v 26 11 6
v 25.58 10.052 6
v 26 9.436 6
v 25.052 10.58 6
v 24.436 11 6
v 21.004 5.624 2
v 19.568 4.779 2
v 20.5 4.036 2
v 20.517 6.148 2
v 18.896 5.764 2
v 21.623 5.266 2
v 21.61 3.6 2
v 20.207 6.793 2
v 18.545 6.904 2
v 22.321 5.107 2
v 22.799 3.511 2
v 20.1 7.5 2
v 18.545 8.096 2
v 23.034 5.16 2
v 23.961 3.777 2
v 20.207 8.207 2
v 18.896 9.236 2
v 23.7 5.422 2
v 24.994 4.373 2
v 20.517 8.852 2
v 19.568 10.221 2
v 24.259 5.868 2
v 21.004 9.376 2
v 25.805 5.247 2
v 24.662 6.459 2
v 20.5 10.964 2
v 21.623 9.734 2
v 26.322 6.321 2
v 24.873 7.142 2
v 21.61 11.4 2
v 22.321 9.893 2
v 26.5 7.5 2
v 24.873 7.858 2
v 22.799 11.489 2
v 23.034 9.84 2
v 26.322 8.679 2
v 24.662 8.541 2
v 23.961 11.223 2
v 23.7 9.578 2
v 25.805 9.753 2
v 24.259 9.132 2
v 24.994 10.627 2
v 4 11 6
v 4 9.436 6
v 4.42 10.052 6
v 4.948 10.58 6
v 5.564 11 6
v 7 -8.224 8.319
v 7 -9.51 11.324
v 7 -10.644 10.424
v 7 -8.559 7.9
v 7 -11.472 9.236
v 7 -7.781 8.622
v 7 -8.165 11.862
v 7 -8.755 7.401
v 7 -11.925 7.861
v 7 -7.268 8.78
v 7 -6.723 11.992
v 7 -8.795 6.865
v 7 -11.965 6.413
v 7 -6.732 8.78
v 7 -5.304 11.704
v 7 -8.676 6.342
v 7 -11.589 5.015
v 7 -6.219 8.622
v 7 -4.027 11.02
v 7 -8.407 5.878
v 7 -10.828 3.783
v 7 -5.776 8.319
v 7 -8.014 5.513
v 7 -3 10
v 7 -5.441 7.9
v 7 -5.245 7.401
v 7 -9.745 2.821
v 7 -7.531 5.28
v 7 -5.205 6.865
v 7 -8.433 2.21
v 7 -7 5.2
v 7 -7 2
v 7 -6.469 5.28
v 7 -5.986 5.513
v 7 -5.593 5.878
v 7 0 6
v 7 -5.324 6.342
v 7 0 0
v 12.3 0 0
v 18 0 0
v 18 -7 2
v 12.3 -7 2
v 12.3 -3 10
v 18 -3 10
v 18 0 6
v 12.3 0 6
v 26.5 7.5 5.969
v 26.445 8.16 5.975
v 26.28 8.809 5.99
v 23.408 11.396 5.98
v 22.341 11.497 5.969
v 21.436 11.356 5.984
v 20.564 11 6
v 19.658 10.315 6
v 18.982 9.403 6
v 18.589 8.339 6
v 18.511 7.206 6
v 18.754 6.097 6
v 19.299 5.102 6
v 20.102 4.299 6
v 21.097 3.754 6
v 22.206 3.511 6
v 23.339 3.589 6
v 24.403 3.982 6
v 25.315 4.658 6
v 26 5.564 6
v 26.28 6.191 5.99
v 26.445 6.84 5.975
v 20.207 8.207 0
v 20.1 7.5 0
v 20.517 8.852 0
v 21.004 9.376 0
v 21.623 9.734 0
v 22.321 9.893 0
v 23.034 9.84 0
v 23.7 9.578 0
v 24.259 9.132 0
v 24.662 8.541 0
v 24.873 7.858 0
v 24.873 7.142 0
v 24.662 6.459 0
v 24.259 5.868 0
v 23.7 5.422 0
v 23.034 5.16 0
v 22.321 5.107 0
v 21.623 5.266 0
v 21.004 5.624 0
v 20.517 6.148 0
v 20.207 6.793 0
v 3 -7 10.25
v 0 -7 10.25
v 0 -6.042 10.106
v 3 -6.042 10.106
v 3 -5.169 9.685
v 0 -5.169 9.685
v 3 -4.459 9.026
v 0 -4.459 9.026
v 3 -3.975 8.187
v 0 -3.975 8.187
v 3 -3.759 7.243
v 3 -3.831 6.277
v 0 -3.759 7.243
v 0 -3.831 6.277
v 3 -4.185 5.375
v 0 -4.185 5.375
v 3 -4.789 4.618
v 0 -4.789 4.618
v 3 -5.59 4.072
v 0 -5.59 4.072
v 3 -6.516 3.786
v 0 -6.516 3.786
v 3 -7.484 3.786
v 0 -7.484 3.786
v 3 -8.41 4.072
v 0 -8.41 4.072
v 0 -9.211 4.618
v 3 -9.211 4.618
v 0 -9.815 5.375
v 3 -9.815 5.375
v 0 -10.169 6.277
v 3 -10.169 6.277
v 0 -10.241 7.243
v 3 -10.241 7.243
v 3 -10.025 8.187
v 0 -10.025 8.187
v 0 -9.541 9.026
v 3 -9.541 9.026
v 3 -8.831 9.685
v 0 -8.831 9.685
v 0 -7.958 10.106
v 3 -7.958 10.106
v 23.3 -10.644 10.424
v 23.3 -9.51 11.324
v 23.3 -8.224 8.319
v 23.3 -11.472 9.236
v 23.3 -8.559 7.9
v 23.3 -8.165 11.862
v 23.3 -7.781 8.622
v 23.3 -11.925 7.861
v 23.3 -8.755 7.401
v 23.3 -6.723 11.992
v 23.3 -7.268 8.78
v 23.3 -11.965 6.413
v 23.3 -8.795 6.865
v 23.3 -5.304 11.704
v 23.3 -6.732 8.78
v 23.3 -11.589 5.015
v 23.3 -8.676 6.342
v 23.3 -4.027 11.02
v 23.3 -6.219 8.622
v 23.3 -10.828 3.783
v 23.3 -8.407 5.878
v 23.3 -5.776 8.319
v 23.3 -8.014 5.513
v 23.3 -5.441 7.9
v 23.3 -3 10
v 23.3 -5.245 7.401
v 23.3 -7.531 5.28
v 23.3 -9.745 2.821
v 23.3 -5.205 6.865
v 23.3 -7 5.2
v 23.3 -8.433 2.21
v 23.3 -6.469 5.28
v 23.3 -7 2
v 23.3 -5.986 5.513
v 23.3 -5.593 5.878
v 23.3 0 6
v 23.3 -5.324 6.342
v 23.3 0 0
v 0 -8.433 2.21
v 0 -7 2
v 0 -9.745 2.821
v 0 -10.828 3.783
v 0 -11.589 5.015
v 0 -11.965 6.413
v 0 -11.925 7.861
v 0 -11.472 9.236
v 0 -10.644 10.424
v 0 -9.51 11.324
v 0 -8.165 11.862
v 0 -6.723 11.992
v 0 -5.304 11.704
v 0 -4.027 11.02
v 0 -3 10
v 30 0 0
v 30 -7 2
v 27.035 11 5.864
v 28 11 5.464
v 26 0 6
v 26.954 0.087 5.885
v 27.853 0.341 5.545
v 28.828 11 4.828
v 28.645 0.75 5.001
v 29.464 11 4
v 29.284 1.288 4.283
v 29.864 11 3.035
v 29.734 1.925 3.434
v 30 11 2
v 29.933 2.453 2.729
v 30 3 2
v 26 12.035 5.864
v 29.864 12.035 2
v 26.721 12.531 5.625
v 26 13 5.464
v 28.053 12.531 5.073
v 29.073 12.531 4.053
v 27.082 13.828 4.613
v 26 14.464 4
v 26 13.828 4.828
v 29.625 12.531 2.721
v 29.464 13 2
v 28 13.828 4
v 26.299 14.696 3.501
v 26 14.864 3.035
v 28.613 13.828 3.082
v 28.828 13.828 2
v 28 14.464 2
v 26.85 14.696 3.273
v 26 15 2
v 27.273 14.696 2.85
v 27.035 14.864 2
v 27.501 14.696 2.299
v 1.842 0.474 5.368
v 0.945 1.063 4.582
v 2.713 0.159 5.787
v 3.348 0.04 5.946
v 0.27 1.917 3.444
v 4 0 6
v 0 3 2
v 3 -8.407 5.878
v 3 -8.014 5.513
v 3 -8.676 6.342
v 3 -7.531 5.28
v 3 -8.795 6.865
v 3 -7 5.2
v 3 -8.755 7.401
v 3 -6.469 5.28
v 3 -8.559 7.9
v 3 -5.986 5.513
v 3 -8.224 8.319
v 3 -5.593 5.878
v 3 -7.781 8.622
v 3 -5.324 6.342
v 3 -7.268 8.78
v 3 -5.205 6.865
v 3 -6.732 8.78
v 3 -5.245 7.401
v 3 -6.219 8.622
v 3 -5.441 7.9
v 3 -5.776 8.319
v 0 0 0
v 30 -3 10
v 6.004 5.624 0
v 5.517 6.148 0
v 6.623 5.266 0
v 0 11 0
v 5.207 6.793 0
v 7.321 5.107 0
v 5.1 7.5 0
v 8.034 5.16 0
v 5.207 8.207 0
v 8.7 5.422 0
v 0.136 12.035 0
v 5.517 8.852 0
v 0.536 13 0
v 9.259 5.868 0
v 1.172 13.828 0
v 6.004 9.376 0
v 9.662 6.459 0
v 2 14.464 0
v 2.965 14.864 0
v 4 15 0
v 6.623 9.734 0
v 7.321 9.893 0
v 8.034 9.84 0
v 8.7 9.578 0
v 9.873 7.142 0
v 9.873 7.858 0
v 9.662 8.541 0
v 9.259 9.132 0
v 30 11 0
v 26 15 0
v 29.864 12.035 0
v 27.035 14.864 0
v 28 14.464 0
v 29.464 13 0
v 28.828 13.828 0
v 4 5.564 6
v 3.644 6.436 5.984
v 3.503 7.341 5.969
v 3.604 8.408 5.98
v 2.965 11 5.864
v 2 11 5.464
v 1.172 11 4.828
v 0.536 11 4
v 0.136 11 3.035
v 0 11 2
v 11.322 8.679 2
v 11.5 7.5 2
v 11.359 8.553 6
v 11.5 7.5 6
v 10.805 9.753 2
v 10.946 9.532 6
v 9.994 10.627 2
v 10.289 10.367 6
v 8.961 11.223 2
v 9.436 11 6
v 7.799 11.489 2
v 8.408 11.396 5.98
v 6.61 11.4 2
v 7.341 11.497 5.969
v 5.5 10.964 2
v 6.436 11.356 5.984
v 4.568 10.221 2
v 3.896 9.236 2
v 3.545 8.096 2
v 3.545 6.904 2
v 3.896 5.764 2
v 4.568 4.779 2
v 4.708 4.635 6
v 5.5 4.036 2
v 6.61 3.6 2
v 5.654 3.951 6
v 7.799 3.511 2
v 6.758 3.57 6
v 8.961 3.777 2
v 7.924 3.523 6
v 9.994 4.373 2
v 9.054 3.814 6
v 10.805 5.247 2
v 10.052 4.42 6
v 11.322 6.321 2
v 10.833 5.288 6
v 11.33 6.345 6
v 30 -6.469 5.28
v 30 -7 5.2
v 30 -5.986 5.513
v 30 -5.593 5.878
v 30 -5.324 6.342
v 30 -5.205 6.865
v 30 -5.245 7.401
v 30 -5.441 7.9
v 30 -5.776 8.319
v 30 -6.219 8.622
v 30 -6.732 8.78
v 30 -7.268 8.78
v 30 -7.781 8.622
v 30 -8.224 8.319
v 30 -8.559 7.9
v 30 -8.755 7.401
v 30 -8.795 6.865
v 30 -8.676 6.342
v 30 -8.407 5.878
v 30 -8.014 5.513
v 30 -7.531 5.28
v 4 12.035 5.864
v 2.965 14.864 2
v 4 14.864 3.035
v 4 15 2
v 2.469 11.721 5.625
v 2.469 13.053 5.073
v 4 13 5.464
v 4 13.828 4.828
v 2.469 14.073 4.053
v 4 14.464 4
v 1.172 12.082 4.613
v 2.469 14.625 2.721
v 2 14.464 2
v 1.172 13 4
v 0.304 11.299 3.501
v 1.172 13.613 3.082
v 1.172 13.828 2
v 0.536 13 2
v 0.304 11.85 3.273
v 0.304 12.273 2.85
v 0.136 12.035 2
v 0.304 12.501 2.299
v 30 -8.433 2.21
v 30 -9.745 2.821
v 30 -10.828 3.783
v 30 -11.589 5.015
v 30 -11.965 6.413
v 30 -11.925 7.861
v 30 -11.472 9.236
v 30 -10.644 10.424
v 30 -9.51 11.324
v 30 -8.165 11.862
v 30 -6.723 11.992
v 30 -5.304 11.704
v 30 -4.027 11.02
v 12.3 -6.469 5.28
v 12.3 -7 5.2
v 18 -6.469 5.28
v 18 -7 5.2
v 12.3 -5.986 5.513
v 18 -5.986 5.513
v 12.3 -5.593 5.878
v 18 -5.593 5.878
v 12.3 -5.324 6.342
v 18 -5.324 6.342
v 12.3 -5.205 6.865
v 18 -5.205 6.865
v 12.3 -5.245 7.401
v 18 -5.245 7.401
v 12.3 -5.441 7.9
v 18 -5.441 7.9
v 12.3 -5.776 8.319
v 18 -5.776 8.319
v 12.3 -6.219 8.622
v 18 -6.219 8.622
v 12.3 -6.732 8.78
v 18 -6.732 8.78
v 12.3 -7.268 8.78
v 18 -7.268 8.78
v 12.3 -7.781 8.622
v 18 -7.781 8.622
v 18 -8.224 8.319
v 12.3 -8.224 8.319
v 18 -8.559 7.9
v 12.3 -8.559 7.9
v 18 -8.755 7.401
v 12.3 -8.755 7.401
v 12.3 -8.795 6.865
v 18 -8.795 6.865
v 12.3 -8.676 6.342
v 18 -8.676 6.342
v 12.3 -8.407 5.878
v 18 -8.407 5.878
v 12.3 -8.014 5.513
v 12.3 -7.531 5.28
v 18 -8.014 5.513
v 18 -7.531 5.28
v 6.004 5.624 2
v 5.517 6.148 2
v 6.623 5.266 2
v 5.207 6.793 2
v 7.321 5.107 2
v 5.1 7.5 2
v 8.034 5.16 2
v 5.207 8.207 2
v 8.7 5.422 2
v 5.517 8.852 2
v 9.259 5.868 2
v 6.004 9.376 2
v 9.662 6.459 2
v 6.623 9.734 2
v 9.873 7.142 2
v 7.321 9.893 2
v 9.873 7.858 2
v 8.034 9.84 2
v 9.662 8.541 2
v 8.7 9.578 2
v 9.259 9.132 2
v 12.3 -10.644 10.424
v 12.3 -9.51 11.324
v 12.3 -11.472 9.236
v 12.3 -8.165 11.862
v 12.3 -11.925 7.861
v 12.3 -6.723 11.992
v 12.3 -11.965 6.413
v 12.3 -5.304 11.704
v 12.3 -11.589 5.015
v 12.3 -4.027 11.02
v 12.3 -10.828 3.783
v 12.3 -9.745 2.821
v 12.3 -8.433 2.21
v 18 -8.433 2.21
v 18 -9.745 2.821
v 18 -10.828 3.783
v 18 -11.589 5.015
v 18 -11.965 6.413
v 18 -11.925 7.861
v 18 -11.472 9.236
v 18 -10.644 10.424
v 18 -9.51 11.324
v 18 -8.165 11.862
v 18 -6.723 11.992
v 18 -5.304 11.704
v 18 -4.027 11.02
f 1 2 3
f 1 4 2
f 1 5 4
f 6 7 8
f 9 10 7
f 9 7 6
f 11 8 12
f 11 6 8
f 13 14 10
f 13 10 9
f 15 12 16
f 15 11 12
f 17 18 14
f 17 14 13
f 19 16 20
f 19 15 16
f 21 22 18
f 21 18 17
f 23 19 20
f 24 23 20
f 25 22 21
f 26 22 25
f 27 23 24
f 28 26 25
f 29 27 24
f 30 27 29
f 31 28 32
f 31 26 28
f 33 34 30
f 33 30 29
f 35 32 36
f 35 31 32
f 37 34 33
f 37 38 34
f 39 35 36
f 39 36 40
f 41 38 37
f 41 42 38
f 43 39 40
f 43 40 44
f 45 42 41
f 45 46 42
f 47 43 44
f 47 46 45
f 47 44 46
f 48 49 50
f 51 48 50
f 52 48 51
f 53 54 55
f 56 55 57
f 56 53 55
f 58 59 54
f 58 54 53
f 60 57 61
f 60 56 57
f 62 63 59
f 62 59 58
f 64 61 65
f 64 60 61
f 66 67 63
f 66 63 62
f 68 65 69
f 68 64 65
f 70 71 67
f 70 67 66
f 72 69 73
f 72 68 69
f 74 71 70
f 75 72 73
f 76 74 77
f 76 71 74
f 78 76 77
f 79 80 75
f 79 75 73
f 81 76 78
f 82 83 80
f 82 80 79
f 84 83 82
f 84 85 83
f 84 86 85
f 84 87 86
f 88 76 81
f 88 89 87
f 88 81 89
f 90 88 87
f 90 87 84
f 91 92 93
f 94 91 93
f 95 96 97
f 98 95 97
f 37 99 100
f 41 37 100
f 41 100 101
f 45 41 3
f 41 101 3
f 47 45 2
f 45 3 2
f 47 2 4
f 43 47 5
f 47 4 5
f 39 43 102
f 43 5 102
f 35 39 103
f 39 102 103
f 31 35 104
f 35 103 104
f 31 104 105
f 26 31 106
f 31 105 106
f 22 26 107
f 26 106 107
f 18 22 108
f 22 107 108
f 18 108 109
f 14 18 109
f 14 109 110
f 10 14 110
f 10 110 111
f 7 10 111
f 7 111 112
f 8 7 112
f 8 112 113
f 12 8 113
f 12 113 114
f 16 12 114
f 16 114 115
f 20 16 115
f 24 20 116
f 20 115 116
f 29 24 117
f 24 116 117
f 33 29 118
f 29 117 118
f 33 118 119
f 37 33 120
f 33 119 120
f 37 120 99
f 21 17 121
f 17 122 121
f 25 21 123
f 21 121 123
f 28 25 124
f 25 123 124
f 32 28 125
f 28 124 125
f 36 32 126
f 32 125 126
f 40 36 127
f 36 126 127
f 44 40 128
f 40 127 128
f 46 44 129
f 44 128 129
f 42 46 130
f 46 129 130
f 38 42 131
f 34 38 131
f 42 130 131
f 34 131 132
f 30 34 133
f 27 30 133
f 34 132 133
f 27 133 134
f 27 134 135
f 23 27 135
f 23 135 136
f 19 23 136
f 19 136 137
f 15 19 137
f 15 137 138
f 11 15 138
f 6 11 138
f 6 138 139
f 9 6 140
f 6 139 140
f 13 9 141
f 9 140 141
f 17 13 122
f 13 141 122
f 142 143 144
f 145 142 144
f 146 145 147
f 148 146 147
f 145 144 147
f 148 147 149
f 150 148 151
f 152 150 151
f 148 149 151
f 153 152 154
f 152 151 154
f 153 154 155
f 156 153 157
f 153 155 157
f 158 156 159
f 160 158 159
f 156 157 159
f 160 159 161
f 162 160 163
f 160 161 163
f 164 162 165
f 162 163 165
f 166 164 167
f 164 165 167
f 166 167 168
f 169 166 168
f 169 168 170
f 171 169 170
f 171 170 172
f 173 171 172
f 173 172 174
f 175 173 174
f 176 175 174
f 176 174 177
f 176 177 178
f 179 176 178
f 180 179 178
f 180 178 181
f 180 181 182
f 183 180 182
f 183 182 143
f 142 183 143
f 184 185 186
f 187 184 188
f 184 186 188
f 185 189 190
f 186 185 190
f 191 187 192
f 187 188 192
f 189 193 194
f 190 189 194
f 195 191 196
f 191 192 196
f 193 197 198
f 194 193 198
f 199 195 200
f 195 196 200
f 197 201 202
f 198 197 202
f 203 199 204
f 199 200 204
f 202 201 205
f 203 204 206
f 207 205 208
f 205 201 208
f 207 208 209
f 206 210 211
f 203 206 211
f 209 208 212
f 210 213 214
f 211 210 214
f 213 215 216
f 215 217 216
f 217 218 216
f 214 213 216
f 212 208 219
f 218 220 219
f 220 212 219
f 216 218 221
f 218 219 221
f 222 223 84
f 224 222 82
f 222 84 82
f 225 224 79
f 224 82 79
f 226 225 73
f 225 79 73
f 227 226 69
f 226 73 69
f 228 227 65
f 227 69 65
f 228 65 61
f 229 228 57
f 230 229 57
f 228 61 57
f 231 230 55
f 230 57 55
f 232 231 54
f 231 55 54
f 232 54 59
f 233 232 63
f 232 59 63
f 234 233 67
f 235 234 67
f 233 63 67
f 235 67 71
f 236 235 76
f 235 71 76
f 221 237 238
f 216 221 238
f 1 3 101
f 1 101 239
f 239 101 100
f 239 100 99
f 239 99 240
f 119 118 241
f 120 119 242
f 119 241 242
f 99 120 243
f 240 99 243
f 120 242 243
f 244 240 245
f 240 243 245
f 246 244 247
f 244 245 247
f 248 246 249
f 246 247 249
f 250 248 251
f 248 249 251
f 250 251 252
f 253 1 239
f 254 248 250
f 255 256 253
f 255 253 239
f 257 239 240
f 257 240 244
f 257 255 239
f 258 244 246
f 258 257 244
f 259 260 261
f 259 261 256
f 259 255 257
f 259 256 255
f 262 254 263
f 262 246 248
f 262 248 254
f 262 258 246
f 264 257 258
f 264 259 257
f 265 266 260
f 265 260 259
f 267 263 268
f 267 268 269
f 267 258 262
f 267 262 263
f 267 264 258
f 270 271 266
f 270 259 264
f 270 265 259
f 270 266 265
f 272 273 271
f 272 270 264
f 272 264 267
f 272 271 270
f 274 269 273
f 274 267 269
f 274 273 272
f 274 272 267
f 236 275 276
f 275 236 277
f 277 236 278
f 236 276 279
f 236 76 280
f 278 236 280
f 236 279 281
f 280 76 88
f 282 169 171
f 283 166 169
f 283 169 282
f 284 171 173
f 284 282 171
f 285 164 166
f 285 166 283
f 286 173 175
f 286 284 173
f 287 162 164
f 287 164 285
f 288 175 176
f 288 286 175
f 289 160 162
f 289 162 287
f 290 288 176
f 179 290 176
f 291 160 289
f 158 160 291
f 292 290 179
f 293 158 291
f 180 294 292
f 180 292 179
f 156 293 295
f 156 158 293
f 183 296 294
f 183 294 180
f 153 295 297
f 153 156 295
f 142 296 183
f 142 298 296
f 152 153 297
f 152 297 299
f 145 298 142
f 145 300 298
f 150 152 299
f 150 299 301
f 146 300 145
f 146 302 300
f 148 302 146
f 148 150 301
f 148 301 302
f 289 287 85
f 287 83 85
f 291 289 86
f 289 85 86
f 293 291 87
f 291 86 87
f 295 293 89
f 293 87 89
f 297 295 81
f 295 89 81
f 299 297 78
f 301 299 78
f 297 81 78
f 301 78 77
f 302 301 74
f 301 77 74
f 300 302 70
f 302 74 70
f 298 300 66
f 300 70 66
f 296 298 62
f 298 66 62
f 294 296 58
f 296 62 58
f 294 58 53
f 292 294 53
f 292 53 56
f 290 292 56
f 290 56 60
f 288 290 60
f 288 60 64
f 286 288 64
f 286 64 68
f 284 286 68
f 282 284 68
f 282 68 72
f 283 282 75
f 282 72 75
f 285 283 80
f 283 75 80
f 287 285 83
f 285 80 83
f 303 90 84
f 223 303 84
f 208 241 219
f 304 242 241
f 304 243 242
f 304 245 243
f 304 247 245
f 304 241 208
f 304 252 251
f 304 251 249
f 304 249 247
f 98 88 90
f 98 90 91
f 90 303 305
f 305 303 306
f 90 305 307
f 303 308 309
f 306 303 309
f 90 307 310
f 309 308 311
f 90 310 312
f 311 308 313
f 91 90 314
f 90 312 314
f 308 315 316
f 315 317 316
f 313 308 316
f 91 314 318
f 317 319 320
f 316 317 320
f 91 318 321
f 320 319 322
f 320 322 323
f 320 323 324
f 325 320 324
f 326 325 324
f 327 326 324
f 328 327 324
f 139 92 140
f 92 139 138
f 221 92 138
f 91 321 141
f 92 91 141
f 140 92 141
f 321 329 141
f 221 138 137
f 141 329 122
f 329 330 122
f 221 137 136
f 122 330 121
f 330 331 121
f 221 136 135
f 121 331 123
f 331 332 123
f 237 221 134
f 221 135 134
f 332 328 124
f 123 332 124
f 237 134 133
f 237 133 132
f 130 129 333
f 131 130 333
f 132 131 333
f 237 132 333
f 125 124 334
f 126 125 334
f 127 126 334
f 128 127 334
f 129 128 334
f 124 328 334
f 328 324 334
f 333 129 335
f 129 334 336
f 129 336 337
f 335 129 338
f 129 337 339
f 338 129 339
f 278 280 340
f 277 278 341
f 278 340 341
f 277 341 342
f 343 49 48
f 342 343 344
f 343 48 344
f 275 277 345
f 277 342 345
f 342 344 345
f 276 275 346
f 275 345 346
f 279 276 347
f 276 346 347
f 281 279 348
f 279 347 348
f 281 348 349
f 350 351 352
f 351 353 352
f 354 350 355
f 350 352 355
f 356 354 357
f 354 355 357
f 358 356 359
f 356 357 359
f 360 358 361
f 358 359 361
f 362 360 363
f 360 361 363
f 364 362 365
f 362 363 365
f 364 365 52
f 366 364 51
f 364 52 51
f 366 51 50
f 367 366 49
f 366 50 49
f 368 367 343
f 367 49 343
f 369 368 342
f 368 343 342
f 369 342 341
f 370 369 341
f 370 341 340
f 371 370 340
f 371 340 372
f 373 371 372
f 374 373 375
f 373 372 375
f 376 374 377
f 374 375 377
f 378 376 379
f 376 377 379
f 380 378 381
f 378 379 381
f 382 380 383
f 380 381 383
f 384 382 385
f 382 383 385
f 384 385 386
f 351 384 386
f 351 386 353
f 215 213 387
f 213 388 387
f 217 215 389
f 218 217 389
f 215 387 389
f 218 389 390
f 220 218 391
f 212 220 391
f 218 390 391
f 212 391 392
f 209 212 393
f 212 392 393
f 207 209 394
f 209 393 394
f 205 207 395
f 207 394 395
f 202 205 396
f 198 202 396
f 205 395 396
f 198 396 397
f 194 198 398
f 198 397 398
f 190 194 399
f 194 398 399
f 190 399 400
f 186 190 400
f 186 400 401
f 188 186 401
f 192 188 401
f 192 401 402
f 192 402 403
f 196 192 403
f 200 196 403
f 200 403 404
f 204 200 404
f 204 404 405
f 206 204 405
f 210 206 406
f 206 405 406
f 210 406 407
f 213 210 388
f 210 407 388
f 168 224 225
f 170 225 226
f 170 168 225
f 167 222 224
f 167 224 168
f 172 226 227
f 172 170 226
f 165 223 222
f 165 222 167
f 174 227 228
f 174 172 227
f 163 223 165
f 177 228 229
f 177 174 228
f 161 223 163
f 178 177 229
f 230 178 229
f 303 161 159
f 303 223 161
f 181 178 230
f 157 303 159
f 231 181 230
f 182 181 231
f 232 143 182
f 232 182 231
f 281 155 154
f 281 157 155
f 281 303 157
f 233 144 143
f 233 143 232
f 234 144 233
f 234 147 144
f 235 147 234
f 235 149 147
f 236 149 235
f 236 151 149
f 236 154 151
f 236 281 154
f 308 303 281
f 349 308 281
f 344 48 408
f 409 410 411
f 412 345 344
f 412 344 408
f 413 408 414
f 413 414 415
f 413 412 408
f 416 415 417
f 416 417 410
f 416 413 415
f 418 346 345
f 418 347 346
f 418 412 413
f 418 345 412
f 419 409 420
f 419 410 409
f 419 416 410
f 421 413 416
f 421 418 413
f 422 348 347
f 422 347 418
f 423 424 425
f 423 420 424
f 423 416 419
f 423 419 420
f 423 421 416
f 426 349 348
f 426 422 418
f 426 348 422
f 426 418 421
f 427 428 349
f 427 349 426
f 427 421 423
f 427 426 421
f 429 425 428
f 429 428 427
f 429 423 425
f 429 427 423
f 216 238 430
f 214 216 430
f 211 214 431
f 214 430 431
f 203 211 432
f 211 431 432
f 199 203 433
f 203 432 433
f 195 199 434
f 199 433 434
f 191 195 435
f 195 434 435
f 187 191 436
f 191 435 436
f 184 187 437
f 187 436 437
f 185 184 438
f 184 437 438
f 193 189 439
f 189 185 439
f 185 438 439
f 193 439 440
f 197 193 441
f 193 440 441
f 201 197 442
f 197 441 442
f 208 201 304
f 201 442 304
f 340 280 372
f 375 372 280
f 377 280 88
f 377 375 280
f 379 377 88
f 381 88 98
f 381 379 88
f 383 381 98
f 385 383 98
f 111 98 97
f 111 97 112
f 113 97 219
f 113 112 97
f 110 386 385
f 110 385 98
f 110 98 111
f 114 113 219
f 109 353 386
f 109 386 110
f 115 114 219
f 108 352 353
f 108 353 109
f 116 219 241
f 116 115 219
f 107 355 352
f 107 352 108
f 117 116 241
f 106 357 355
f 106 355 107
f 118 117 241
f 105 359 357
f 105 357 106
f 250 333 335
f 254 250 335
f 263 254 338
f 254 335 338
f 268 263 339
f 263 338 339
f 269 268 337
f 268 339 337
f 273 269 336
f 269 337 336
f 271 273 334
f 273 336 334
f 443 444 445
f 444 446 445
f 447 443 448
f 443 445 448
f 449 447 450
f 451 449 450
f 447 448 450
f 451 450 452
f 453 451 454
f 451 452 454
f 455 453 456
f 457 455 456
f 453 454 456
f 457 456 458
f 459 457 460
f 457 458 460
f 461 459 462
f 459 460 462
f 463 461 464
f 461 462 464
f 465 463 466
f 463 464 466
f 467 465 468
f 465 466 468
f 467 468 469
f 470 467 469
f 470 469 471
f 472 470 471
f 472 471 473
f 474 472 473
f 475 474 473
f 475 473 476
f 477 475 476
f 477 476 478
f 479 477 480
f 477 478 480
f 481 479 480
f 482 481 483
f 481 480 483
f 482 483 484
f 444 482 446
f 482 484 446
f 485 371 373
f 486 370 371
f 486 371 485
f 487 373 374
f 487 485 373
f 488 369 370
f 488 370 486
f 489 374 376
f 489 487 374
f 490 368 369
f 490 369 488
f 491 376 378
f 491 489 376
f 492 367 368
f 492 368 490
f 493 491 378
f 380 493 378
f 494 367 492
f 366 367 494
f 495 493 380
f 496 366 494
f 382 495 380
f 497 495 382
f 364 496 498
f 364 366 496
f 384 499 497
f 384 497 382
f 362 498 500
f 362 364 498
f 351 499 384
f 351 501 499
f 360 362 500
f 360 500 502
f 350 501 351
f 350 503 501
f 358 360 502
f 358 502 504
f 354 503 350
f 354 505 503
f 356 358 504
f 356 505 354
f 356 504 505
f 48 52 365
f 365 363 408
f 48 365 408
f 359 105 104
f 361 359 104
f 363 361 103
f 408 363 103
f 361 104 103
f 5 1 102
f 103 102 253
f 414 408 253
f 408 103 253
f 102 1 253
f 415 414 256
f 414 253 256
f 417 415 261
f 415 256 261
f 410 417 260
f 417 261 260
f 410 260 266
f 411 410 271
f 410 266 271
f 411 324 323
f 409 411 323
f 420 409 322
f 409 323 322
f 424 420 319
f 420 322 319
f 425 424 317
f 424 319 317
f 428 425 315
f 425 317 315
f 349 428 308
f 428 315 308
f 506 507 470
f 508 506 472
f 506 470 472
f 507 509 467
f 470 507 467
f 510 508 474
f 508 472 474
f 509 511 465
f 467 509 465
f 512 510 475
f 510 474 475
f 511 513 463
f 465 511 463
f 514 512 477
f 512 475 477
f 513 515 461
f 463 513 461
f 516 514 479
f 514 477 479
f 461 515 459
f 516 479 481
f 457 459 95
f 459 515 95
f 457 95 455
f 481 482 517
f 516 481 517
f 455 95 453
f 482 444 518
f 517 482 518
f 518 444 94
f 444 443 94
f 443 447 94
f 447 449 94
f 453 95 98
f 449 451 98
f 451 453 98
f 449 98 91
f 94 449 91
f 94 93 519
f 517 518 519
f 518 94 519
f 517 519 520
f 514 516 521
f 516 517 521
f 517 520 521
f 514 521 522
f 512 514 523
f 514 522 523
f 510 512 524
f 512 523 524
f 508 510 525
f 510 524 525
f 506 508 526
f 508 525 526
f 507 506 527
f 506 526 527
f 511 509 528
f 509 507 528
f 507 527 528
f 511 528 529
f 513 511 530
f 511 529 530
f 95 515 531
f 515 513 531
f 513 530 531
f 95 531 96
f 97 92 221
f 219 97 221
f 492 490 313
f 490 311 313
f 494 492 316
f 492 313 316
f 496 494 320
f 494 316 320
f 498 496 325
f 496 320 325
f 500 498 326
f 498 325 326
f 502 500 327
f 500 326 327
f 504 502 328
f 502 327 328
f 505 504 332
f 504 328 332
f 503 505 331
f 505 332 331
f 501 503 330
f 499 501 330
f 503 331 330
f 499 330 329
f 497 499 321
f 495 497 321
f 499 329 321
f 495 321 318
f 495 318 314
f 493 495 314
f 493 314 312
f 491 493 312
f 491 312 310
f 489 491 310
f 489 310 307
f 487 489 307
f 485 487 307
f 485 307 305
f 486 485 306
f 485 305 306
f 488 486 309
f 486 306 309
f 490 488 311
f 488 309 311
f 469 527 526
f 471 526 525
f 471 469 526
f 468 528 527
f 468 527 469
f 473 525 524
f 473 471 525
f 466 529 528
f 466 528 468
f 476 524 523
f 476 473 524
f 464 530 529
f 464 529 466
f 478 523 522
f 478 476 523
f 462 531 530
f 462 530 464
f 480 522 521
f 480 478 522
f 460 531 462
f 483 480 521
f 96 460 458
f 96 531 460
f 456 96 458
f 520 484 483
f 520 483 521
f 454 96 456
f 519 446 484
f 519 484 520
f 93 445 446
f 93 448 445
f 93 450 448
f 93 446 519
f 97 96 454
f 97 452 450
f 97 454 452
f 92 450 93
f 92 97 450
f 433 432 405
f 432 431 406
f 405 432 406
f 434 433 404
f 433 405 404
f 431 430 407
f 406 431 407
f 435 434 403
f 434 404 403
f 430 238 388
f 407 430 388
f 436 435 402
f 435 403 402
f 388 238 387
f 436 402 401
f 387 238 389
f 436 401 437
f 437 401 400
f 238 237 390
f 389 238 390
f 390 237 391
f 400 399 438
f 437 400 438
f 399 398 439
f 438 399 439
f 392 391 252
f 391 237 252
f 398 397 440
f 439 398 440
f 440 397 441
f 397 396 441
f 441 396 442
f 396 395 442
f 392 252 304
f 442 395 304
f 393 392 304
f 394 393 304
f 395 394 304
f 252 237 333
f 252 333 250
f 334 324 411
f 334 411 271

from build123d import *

# Parameters (mm, degrees)
SKETCH2_W                      = 30
SKETCH2_H                      = 15
BOSS_EXTRUDE1_DEPTH            = 6
CBORE_FOR_M4_SHCS1_D           = 4.8
CBORE_FOR_M4_SHCS1_CBORE_D     = 8
CBORE_FOR_M4_SHCS1_CBORE_DEPTH = 4
BOSS_EXTRUDE2_DEPTH            = 30
CUT_EXTRUDE1_START             = -15
SKETCH6_W                      = 5.3
SKETCH6_H                      = 20.435085946
SKETCH6_H_2                    = 17.047451378
CUT_EXTRUDE1_DEPTH             = 28.107006543
FILLET1_R                      = 4
CBORE_FOR_M3_SHCS1_D           = 3.6
CBORE_FOR_M3_SHCS1_CBORE_D     = 6.5
CBORE_FOR_M3_SHCS1_CBORE_DEPTH = 3


with BuildPart() as part:
    # Sketch2 → Boss-Extrude1 (new body)
    with BuildSketch(Plane.XY):
        with Locations((15, 7.5)):
            Rectangle(SKETCH2_W, SKETCH2_H)
    extrude(amount=BOSS_EXTRUDE1_DEPTH)

    # CBORE for M4 SHCS1 (through all)
    with Locations(Plane.XY.offset(6)):
        with Locations((7.5, 7.5), (22.5, 7.5)):
            CounterBoreHole(CBORE_FOR_M4_SHCS1_D / 2, CBORE_FOR_M4_SHCS1_CBORE_D / 2, CBORE_FOR_M4_SHCS1_CBORE_DEPTH)

    # Sketch5 → Boss-Extrude2 (add)
    with BuildSketch(Plane(origin=(30, 0, 0), x_dir=(0, 0, -1), z_dir=(1, 0, 0))):
        with BuildLine():
            Line((0, 0), (-2, -7))
            ThreePointArc((-2, -7), (-9.236067977, -11.472135955), (-10, -3))
            Line((-10, -3), (-6, 0))
            Line((-6, 0), (0, 0))
        make_face()
    extrude(amount=-BOSS_EXTRUDE2_DEPTH)

    # Sketch6 → Cut-Extrude1 (cut, through all)
    with BuildSketch(Plane(origin=(0, 15, 0), x_dir=(1, 0, 0), z_dir=(0, 1, 0)).offset(CUT_EXTRUDE1_START)):
        with Locations((20.65, -5.918041099)):
            Rectangle(SKETCH6_W, SKETCH6_H)
        with Locations((9.65, -5.207730625)):
            Rectangle(SKETCH6_W, SKETCH6_H_2)
    extrude(amount=-CUT_EXTRUDE1_DEPTH, mode=Mode.SUBTRACT)

    # Fillet1
    # the kernel refuses this fillet: 4 mm, written as the material it takes off along each edge
    with BuildSketch(Plane(origin=(26, 11, 2), x_dir=(0, 0, 1), z_dir=(0, 1, 0))) as fillet1_piece_1_section:
        Polygon((0, 0), (FILLET1_R, 0), (FILLET1_R, FILLET1_R), (0, FILLET1_R), align=None)
    fillet1_piece_1 = extrude(amount=FILLET1_R, mode=Mode.PRIVATE)
    fillet1_piece_1 = fillet1_piece_1 - Plane(origin=(26, 11, 2), x_dir=(-0.7071067811865475, 0, -0.7071067811865475), z_dir=(0, 1, 0)) * Sphere(FILLET1_R, mode=Mode.PRIVATE)
    add(fillet1_piece_1, mode=Mode.SUBTRACT)
    with BuildSketch(Plane(origin=(4, 11, 2), x_dir=(0, 1, 0), z_dir=(-1, 0, 0))) as fillet1_piece_2_section:
        Polygon((0, 0), (FILLET1_R, 0), (FILLET1_R, -FILLET1_R), (0, -FILLET1_R), align=None)
    fillet1_piece_2 = extrude(amount=FILLET1_R, mode=Mode.PRIVATE)
    fillet1_piece_2 = fillet1_piece_2 - Plane(origin=(4, 11, 2), x_dir=(0, -0.7071067811865475, -0.7071067811865475), z_dir=(-1, 0, 0)) * Sphere(FILLET1_R, mode=Mode.PRIVATE)
    add(fillet1_piece_2, mode=Mode.SUBTRACT)
    with BuildSketch(Plane(origin=(30, -10, 6), x_dir=(-1, 0, 0), z_dir=(0, 1, 0))) as fillet1_piece_3_section:
        with BuildLine():
            CenterArc((FILLET1_R, -FILLET1_R), FILLET1_R, 90, 90)
            Line((0, -FILLET1_R), (0, 0))
            Line((0, 0), (FILLET1_R, 0))
        make_face()
    fillet1_piece_3 = extrude(amount=21, mode=Mode.PRIVATE)
    fillet1_piece_3 = split(fillet1_piece_3, bisect_by=Plane(origin=(29.062495656, 2.503698405, 2.66173546), z_dir=(0, 0.8, 0.6)), keep=Keep.TOP, mode=Mode.PRIVATE)
    add(fillet1_piece_3, mode=Mode.SUBTRACT)
    with BuildSketch(Plane(origin=(26, 15, 6), x_dir=(0, 0, -1), z_dir=(-1, 0, 0))) as fillet1_piece_4:
        with BuildLine():
            CenterArc((FILLET1_R, FILLET1_R), FILLET1_R, 180, 90)
            Line((0, FILLET1_R), (0, 0))
            Line((0, 0), (FILLET1_R, 0))
        make_face()
    extrude(amount=22, mode=Mode.SUBTRACT)
    with BuildSketch(Plane(origin=(0, 11, 6), x_dir=(0, 0, -1), z_dir=(0, -1, 0))) as fillet1_piece_5_section:
        with BuildLine():
            CenterArc((FILLET1_R, FILLET1_R), FILLET1_R, 180, 90)
            Line((0, FILLET1_R), (0, 0))
            Line((0, 0), (FILLET1_R, 0))
        make_face()
    fillet1_piece_5 = extrude(amount=21, mode=Mode.PRIVATE)
    fillet1_piece_5 = split(fillet1_piece_5, bisect_by=Plane(origin=(0.937504344, 2.503698405, 2.66173546), z_dir=(0, 0.8, 0.6)), keep=Keep.TOP, mode=Mode.PRIVATE)
    add(fillet1_piece_5, mode=Mode.SUBTRACT)
    with BuildSketch(Plane(origin=(0, 15, -10), x_dir=(0, -1, 0), z_dir=(0, 0, 1)), Plane(origin=(30, 15, -10), x_dir=(-1, 0, 0), z_dir=(0, 0, 1))) as fillet1_piece_6:
        with BuildLine():
            CenterArc((FILLET1_R, FILLET1_R), FILLET1_R, 180, 90)
            Line((0, FILLET1_R), (0, 0))
            Line((0, 0), (FILLET1_R, 0))
        make_face()
    extrude(amount=12, mode=Mode.SUBTRACT)

    # CBORE for M3 SHCS1 (through all)
    with Locations(Plane.ZY):
        with Locations((7, -7)):
            CounterBoreHole(CBORE_FOR_M3_SHCS1_D / 2, CBORE_FOR_M3_SHCS1_CBORE_D / 2, CBORE_FOR_M3_SHCS1_CBORE_DEPTH)


solid = part.part
